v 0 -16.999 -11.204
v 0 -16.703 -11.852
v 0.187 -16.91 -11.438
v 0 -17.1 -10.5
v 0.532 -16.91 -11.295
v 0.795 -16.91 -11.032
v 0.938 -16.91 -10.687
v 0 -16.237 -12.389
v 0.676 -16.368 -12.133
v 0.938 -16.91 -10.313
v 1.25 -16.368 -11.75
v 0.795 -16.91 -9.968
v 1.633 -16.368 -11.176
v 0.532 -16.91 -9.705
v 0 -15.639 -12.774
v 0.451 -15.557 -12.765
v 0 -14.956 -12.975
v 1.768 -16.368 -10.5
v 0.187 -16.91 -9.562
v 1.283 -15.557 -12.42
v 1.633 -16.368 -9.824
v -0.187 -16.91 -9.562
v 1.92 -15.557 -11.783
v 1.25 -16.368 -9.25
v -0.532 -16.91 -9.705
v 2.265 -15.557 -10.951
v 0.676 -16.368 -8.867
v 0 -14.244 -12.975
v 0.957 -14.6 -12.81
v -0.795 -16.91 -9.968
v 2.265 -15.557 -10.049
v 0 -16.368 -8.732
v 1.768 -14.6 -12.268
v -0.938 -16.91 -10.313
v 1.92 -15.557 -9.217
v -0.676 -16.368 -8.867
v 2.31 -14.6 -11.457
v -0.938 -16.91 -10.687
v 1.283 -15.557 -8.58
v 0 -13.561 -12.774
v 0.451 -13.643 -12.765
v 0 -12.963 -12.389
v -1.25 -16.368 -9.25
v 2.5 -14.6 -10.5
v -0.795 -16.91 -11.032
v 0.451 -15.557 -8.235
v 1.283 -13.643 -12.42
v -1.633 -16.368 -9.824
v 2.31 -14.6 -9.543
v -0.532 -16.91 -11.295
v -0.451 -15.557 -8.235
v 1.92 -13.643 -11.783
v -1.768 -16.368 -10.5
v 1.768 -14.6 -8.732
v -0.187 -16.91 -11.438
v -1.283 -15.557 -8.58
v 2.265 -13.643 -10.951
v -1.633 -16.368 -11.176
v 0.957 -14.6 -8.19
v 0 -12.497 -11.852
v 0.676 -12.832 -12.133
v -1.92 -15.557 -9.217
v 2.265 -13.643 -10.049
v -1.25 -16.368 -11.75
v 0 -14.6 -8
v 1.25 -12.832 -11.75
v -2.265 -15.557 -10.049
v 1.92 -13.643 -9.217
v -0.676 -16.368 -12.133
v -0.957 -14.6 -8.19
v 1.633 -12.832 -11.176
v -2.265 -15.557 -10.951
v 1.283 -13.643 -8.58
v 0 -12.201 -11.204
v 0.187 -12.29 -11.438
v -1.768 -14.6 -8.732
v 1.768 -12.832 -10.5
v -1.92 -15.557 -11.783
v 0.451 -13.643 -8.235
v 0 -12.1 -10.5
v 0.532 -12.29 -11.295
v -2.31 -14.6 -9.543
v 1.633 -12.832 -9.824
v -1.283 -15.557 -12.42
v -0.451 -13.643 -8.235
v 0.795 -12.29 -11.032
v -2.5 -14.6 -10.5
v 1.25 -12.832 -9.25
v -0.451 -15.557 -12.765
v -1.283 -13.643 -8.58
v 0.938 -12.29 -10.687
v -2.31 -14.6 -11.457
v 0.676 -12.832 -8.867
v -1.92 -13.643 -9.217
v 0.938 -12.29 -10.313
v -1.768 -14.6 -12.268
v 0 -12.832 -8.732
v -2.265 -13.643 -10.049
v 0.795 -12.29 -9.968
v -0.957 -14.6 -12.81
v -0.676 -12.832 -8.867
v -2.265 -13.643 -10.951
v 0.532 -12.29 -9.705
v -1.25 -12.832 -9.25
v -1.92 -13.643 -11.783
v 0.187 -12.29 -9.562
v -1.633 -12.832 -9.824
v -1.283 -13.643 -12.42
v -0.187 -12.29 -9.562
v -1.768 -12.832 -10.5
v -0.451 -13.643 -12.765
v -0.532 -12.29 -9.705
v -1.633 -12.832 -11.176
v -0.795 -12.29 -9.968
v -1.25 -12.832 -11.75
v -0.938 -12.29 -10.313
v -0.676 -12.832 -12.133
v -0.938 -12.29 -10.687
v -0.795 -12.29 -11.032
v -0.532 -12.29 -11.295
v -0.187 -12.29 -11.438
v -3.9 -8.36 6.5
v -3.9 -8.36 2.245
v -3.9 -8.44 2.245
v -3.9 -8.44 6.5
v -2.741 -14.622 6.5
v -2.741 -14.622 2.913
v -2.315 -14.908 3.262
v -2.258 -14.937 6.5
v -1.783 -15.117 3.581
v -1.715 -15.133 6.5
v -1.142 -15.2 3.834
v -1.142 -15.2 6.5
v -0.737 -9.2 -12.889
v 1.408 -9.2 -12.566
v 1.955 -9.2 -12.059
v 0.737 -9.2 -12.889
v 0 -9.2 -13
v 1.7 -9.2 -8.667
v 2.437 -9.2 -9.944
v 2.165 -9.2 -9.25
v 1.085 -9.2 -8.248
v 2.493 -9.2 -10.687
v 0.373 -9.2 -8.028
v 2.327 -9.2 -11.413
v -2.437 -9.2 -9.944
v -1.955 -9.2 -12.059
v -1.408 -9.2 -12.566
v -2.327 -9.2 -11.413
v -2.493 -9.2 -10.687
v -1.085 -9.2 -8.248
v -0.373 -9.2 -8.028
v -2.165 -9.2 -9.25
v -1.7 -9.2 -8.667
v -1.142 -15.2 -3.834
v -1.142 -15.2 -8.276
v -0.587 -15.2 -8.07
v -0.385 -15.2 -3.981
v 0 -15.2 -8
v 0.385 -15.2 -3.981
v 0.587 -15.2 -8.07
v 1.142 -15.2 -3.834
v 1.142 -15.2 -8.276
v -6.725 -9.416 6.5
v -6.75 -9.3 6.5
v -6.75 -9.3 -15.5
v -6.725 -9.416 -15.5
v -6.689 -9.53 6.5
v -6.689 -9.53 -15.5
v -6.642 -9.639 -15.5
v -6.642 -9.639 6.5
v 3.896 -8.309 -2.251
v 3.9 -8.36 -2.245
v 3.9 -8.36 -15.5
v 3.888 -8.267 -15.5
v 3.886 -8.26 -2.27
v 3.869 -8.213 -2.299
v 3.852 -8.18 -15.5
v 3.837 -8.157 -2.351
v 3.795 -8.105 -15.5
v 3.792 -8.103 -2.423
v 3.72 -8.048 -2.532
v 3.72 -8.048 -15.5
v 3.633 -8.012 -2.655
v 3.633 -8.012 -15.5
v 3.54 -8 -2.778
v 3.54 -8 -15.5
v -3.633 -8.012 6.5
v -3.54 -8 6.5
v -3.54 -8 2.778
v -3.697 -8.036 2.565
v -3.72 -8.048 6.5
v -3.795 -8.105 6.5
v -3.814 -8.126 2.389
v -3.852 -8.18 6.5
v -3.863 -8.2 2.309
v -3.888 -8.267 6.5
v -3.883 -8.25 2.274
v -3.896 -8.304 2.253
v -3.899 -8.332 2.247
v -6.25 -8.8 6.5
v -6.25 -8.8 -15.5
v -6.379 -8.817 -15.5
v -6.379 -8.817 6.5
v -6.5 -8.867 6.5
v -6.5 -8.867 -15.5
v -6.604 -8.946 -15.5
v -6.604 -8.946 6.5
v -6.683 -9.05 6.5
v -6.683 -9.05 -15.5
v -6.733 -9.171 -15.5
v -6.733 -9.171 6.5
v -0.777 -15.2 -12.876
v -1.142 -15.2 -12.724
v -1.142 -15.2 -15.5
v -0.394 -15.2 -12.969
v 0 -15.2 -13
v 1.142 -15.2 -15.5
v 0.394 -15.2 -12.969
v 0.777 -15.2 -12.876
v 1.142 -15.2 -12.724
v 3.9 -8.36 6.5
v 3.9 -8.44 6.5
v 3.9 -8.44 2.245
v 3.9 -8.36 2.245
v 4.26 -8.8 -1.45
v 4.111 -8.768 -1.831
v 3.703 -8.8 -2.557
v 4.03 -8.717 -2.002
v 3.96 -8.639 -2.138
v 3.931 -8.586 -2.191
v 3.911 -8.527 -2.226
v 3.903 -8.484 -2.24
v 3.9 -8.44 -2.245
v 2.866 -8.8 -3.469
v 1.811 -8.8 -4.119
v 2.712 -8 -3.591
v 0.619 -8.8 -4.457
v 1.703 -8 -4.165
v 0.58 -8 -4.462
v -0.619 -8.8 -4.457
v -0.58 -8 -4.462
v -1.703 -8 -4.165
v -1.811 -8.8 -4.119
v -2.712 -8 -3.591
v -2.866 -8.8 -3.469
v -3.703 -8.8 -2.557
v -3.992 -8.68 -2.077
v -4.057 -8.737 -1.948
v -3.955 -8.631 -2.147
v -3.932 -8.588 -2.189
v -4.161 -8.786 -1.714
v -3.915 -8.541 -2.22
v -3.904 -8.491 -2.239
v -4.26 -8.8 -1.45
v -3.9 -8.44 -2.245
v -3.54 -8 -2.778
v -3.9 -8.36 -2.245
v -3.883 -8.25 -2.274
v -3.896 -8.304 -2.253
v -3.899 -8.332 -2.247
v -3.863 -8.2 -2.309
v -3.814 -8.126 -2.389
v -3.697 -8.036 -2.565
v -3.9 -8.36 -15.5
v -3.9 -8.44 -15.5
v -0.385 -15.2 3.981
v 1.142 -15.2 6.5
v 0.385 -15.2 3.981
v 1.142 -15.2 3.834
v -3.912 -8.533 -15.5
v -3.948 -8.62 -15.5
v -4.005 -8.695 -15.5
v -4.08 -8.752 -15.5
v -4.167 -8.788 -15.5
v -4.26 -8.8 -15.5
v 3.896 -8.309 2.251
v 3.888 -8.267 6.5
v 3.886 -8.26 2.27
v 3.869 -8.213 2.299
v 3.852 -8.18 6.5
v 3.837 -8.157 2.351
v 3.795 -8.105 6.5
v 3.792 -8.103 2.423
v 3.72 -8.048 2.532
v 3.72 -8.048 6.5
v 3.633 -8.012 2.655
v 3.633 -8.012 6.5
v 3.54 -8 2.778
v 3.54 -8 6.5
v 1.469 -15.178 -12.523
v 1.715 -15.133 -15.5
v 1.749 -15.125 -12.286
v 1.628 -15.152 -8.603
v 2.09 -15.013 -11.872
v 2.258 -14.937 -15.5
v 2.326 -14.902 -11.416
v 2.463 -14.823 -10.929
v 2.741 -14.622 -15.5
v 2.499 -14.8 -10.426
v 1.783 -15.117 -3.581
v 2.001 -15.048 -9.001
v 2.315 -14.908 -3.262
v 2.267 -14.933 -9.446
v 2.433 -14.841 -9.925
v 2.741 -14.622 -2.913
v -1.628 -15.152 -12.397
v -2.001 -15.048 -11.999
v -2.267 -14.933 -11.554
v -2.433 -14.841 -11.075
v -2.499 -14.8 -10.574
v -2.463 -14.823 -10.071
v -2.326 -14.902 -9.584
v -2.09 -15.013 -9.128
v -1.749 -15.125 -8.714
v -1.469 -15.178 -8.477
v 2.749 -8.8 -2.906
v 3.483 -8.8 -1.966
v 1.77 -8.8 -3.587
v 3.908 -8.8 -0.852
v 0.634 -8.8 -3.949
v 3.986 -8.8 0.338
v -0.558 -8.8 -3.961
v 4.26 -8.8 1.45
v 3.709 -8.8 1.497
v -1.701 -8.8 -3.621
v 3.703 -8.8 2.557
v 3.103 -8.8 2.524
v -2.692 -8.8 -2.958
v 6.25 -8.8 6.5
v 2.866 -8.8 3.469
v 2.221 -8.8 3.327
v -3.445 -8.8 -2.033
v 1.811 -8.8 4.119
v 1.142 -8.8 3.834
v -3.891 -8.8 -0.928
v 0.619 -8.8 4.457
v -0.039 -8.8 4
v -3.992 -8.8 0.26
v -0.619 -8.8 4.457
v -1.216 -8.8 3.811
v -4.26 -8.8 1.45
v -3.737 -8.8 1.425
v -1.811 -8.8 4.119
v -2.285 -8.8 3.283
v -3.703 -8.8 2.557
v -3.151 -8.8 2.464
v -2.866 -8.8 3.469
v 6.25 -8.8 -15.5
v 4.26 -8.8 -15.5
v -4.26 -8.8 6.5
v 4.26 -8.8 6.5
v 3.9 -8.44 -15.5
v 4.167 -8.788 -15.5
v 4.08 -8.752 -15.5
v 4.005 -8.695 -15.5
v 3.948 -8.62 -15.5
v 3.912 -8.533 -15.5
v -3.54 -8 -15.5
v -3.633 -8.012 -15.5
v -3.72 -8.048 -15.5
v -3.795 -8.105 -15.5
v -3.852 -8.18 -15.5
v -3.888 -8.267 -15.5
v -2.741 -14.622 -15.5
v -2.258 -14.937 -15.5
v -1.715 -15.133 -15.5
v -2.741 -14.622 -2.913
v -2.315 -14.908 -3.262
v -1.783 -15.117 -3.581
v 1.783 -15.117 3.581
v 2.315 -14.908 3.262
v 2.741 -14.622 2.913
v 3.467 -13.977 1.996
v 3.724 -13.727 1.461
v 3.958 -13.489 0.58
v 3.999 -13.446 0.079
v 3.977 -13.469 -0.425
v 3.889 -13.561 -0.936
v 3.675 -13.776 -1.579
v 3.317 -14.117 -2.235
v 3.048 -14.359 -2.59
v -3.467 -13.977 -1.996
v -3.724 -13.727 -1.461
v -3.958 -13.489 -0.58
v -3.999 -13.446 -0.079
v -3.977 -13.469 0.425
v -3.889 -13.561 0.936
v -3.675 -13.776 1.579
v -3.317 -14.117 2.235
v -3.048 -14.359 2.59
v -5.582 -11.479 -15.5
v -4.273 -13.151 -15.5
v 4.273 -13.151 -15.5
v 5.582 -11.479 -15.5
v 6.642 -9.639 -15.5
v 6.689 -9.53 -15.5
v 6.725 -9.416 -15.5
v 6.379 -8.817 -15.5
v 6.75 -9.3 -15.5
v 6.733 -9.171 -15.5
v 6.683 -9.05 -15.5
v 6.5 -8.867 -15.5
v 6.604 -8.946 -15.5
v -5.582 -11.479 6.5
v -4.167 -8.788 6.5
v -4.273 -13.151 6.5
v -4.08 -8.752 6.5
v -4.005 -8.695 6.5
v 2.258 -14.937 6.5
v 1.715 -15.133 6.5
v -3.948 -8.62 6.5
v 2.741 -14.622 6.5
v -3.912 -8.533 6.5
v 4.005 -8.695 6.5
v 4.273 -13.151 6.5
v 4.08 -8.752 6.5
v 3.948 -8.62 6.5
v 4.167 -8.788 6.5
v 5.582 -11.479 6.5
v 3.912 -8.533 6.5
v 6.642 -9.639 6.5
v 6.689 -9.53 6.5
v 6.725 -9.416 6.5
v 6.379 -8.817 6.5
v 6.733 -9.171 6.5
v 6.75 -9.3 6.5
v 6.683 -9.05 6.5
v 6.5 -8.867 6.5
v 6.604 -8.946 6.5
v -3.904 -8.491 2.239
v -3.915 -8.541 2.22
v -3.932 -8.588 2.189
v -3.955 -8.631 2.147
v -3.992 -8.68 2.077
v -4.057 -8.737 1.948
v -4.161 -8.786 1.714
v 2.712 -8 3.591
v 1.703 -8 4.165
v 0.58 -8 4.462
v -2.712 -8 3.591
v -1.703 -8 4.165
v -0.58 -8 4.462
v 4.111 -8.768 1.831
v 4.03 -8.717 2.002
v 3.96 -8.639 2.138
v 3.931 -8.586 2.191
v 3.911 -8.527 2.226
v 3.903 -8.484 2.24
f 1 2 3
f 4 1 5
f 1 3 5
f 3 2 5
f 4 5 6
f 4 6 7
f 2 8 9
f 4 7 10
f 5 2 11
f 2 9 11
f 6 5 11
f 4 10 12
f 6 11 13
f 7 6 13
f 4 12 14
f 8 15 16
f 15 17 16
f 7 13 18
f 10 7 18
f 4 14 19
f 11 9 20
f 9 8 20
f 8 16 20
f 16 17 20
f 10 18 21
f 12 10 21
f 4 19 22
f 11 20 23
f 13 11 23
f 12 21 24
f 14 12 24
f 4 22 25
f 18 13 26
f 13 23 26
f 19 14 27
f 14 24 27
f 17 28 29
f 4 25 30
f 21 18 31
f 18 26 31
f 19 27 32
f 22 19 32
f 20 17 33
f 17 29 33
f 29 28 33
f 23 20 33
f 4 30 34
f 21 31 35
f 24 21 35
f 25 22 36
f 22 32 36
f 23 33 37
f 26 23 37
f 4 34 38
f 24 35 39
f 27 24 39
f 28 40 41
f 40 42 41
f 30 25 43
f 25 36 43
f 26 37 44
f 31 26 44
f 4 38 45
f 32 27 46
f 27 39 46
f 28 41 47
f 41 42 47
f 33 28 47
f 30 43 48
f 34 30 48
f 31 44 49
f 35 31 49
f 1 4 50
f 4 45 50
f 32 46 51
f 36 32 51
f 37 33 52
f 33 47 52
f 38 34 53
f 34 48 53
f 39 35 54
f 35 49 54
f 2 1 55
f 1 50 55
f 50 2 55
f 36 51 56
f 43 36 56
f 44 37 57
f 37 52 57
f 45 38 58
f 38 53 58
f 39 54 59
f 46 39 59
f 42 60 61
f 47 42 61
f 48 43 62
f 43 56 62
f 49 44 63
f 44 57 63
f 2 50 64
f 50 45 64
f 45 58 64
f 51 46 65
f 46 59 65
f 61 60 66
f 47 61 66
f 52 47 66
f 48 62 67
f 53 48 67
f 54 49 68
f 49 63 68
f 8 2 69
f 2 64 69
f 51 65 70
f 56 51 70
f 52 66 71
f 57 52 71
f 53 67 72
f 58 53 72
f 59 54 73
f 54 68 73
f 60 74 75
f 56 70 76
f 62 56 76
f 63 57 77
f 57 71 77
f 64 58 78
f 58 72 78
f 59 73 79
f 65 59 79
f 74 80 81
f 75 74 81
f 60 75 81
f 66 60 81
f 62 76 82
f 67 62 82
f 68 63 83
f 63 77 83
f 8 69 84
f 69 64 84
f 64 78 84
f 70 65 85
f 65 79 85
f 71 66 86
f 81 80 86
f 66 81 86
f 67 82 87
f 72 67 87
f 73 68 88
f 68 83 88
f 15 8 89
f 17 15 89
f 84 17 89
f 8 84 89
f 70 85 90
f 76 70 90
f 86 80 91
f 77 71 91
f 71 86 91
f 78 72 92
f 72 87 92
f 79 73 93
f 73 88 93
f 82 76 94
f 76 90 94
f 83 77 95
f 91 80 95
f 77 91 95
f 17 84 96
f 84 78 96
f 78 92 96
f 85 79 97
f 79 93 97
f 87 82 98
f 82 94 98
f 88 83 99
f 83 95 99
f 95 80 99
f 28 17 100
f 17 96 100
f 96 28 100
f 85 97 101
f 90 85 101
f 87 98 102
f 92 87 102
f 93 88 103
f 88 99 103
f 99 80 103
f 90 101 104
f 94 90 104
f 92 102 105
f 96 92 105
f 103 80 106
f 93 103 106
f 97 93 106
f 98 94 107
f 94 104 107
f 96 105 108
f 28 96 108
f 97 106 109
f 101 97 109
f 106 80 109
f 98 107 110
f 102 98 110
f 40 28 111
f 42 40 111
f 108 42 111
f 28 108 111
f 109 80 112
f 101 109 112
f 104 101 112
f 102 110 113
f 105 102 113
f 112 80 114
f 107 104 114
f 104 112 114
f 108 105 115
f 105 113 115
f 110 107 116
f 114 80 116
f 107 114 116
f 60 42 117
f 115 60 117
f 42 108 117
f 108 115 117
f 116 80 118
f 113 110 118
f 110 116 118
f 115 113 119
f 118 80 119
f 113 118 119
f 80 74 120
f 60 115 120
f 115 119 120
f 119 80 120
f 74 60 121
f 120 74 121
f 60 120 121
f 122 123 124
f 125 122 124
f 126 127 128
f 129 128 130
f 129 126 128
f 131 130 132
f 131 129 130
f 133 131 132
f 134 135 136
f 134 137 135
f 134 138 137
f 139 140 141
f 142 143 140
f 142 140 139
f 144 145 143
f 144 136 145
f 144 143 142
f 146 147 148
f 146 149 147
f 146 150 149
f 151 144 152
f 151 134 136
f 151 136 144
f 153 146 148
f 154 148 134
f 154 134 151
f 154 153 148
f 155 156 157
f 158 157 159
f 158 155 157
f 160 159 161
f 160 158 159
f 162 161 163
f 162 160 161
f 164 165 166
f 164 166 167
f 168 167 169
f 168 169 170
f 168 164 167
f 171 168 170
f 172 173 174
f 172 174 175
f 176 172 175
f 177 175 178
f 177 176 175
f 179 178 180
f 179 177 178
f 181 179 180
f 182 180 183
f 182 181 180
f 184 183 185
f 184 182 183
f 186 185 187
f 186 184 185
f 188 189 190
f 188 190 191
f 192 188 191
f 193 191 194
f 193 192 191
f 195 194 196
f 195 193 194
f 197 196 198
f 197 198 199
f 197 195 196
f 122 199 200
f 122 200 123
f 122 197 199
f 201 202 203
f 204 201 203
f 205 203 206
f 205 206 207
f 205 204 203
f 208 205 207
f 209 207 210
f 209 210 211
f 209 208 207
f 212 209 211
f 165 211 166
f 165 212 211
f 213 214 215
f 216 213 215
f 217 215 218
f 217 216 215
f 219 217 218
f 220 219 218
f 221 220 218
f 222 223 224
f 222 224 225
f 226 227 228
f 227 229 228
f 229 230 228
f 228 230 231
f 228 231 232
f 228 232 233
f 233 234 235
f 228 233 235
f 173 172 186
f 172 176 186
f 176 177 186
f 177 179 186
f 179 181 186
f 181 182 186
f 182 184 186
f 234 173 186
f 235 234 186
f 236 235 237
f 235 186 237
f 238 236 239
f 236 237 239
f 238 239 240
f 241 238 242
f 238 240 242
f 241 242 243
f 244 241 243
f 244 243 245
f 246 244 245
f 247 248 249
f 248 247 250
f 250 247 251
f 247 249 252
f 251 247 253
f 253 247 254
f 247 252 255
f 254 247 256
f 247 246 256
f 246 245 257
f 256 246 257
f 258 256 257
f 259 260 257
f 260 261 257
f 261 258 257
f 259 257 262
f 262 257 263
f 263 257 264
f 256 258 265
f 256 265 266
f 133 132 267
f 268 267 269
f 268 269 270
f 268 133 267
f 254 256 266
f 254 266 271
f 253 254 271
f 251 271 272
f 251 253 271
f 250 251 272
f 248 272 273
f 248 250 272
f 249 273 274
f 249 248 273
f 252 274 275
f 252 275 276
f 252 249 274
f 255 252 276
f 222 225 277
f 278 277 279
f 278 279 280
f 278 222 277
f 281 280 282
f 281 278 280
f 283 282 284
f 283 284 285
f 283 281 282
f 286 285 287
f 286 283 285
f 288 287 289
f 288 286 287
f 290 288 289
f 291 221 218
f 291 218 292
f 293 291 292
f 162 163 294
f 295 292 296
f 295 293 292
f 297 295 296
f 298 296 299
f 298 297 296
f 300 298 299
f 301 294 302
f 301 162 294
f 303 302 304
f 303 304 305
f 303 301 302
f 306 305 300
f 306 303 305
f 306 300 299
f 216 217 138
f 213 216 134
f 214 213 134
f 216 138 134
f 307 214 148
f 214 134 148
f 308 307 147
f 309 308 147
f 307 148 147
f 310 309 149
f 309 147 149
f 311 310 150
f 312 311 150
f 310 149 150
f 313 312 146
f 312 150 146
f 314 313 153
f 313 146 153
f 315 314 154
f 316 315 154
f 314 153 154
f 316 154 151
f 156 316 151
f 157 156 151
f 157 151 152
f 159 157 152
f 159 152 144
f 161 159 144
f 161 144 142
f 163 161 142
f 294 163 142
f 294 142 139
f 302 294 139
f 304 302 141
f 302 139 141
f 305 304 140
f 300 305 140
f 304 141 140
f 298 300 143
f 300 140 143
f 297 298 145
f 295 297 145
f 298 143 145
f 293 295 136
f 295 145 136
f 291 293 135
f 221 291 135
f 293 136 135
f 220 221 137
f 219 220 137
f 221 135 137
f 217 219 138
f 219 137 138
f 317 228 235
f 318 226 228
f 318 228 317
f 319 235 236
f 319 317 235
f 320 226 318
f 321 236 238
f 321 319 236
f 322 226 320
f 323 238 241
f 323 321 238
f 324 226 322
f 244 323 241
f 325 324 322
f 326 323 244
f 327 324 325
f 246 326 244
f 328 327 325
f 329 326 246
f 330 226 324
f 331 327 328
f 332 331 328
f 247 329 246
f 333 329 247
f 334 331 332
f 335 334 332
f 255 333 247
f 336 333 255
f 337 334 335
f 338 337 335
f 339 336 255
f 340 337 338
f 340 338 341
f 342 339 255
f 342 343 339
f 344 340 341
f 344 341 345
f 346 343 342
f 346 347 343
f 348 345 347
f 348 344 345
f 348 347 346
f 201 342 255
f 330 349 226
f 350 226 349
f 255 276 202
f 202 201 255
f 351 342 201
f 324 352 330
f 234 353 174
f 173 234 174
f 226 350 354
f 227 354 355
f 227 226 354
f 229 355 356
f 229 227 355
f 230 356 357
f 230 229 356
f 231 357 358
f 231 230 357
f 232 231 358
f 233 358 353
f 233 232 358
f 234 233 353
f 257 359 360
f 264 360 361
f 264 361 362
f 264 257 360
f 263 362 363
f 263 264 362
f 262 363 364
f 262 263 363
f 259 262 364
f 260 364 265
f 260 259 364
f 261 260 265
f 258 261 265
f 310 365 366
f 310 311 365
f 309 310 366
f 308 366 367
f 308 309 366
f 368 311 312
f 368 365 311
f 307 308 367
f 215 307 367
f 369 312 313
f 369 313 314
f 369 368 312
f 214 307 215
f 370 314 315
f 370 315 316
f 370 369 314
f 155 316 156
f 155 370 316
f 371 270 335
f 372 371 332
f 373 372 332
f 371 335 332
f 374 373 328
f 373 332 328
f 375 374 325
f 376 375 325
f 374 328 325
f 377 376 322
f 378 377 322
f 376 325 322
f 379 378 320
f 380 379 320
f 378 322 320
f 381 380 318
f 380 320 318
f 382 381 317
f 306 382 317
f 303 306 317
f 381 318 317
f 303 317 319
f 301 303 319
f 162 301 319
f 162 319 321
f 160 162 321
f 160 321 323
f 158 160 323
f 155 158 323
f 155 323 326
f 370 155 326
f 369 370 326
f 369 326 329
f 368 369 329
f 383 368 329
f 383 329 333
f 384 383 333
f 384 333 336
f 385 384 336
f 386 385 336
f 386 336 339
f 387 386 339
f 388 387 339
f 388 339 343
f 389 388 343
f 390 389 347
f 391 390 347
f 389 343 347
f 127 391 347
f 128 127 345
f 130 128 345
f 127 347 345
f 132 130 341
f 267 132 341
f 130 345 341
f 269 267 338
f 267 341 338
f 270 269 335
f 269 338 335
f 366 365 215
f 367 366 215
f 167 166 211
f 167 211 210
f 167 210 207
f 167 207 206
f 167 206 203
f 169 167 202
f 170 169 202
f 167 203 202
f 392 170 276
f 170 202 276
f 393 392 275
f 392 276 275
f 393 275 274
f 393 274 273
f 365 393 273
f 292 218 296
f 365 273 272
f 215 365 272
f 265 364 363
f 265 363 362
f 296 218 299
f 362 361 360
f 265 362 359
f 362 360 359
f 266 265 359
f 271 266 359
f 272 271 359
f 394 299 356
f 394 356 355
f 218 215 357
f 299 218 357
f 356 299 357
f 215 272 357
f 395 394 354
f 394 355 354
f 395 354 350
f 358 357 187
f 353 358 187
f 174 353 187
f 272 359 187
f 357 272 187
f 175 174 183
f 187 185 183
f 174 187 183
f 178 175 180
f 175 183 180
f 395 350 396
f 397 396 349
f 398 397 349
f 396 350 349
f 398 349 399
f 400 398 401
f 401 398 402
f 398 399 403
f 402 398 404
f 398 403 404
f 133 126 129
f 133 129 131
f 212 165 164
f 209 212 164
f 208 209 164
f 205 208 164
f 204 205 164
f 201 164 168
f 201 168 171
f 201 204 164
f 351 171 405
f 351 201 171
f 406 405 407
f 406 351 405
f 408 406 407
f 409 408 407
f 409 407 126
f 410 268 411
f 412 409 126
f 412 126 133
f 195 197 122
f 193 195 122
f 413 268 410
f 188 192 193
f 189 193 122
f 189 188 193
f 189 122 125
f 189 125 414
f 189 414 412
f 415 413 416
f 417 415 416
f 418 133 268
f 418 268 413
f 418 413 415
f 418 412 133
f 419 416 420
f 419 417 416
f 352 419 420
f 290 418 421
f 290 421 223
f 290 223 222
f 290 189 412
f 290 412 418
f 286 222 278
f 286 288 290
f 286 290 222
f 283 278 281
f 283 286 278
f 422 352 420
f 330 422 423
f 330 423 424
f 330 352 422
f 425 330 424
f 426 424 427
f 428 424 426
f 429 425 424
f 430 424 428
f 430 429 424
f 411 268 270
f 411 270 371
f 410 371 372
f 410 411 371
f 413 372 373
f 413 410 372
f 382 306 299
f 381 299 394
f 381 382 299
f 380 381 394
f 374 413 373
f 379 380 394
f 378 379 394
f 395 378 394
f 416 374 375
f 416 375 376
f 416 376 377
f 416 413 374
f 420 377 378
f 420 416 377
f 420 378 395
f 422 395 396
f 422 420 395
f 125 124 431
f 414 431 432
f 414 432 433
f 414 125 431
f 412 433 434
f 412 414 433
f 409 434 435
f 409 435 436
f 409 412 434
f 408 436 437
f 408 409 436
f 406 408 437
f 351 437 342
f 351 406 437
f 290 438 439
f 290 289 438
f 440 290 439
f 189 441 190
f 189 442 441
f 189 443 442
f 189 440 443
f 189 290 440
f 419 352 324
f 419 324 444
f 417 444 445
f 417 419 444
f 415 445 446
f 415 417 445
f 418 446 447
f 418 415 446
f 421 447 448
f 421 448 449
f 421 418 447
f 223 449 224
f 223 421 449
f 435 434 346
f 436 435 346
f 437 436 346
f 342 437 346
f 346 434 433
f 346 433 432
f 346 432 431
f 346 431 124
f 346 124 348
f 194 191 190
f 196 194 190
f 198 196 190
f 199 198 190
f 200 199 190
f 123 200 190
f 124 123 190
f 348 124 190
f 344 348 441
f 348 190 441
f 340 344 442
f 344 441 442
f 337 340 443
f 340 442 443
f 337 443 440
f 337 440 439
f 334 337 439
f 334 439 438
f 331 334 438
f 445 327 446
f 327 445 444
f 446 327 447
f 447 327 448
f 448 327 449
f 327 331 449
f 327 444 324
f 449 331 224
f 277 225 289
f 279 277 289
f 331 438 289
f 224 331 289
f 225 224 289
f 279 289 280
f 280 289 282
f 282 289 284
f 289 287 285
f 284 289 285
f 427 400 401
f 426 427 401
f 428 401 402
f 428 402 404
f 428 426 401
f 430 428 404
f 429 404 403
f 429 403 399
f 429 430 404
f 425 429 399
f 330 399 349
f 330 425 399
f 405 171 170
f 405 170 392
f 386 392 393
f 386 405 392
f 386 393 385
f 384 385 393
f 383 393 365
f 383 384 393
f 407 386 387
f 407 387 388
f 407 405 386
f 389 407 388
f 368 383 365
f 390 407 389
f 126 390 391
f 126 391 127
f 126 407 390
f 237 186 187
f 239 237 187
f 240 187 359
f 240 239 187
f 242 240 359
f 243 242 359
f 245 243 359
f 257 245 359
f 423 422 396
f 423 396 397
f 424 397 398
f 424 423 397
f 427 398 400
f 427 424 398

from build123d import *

# Parameters (mm, degrees)
SKETCH1_R           = 4
BOSS_EXTRUDE1_DEPTH = 16
CUT_SWEEP1_PITCH    = 1.25
SKETCH4_OUTSIDE_W   = 16.42
SKETCH4_OUTSIDE_H   = 16.42
SKETCH4_OUTSIDE_R   = 3.052784715
CUT_EXTRUDE1_DEPTH  = 1.25
CUT_EXTRUDE1_DRAFT  = -45
CUT_EXTRUDE2_DEPTH  = 3
BOSS_EXTRUDE2_START = 6.5
BOSS_EXTRUDE2_DEPTH = 22
SKETCH9_R           = 4
CUT_EXTRUDE4_DEPTH  = 24.350588956
SKETCH10_W          = 2.5
SKETCH10_H          = 6
CUT_EXTRUDE5_REACH  = 23.048
SKETCH12_R          = 4.5


with BuildPart() as part:
    # Sketch1 → Boss-Extrude1 (new body)
    with BuildSketch(Plane(origin=(0, 0, 0), x_dir=(1, 0, 0), z_dir=(0, 1, 0))):
        with Locations(Location((0, 0, 0), (0, 0, 270))):
            Circle(SKETCH1_R)
    extrude(amount=-BOSS_EXTRUDE1_DEPTH)

    # Cut-Sweep1: the profile of Sketch3 screwed along a right-hand helix of 13.8 turns, 8 arcs to a turn; built about Z, then put on its axis
    cut_sweep1_z = Axis((0, 0, 0), (0, 0, 1))
    cut_sweep1_corners = [(3.188101184, 0, -0.46875), (4.067658235, 0, 0.0390625), (4.067658235, 0, -1.1328125), (3.188101184, 0, -0.625)]
    with BuildLine(mode=Mode.PRIVATE) as cut_sweep1_profile:
        Line(cut_sweep1_corners[0], cut_sweep1_corners[1])
        Line(cut_sweep1_corners[1], cut_sweep1_corners[2])
        Line(cut_sweep1_corners[2], cut_sweep1_corners[3])
        Line(cut_sweep1_corners[3], cut_sweep1_corners[0])
    cut_sweep1_cap = Face(cut_sweep1_profile.wire())
    cut_sweep1_turn_angles = [0, 22.5, 45, 67.5, 90, 112.5, 135, 157.5, 180, 202.5, 225, 247.5, 270, 292.5, 315, 337.5, 360]
    cut_sweep1_turn_weights = [1, 0.9238795325112867, 1, 0.9238795325112867, 1, 0.9238795325112867, 1, 0.9238795325112867, 1, 0.9238795325112867, 1, 0.9238795325112867, 1, 0.9238795325112867, 1, 0.9238795325112867, 1]
    cut_sweep1_turn_rails = [Edge.make_bspline([Vector(p[0], p[1], 0).rotate(cut_sweep1_z, cut_sweep1_turn_angles[k]) / cut_sweep1_turn_weights[k] + Vector(0, 0, p[2] + CUT_SWEEP1_PITCH * cut_sweep1_turn_angles[k] / 360) for k in range(17)], [0, 0, 0, 1, 1, 2, 2, 3, 3, 4, 4, 5, 5, 6, 6, 7, 7, 8, 8, 8], 2, cut_sweep1_turn_weights) for p in cut_sweep1_corners]
    cut_sweep1_turn_sides = [Face.make_surface_from_curves(cut_sweep1_turn_rails[p[0]], cut_sweep1_turn_rails[p[1]]) for p in [(0, 1), (1, 2), (2, 3), (3, 0)]]
    cut_sweep1_last_angles = [4680, 4702.5, 4725, 4747.5, 4770, 4792.5, 4815, 4837.5, 4860, 4882.5, 4905, 4927.5, 4950, 4959, 4968]
    cut_sweep1_last_weights = [1, 0.9238795325112867, 1, 0.9238795325112867, 1, 0.9238795325112867, 1, 0.9238795325112867, 1, 0.9238795325112867, 1, 0.9238795325112867, 1, 0.9876883405951427, 1]
    cut_sweep1_last_rails = [Edge.make_bspline([Vector(p[0], p[1], 0).rotate(cut_sweep1_z, cut_sweep1_last_angles[k]) / cut_sweep1_last_weights[k] + Vector(0, 0, p[2] + CUT_SWEEP1_PITCH * cut_sweep1_last_angles[k] / 360) for k in range(15)], [0, 0, 0, 1, 1, 2, 2, 3, 3, 4, 4, 5, 5, 6, 6, 7, 7, 7], 2, cut_sweep1_last_weights) for p in cut_sweep1_corners]
    cut_sweep1_last_sides = [Face.make_surface_from_curves(cut_sweep1_last_rails[p[0]], cut_sweep1_last_rails[p[1]]) for p in [(0, 1), (1, 2), (2, 3), (3, 0)]]
    cut_sweep1 = Plane(origin=(0, -16, 0), x_dir=(0, 0, -1), z_dir=(0, 1, 0)) * Solid(Shell([*[p.moved(Location((0, 0, CUT_SWEEP1_PITCH * i))) for i in range(13) for p in cut_sweep1_turn_sides], *cut_sweep1_last_sides, cut_sweep1_cap, cut_sweep1_cap.rotate(cut_sweep1_z, 4968).moved(Location((0, 0, CUT_SWEEP1_PITCH * 4968 / 360)))]))
    add(cut_sweep1, mode=Mode.SUBTRACT)


with BuildPart() as cut_extrude1_tool:
    # Sketch4 outside → Cut-Extrude1 (with draft: the straight prism first)
    with BuildSketch(Plane.XZ.offset(16)):
        Rectangle(SKETCH4_OUTSIDE_W, SKETCH4_OUTSIDE_H)
        Circle(SKETCH4_OUTSIDE_R, mode=Mode.SUBTRACT)
    extrude(amount=-CUT_EXTRUDE1_DEPTH)
    # Cut-Extrude1: the draft: its side faces are tilted about the plane it starts from
    cut_extrude1_sides = [cut_extrude1_tool.faces().sort_by_distance(p)[0] for p in [
        (0, -15.375, -8.21),
        (8.21, -15.375, 0),
        (0, -15.375, 8.21),
        (-8.21, -15.375, 0),
        (-3.052784715, -15.375, 0),
    ]]
    draft(cut_extrude1_sides, Plane.XZ.offset(16), CUT_EXTRUDE1_DRAFT)


with BuildPart() as part_1:
    add(part.part)

    # Cut-Extrude1: cut by cut_extrude1_tool
    add(cut_extrude1_tool.part, mode=Mode.SUBTRACT)

    # Sketch5 → Revolve1 (revolve)
    with BuildSketch(Plane.XY, mode=Mode.PRIVATE) as revolve1_sk:
        with BuildLine():
            Line((0, 4.4), (0, 0))
            Line((0, 0), (-7, 0))
            Line((-7, 0), (-7, 1.1))
            ThreePointArc((-7, 1.1), (-5.74216858, 2.970153254), (-4, 4.4))
            Line((-4, 4.4), (0, 4.4))
        make_face()
    revolve(revolve1_sk.sketch.rotate(Axis((0, 0, 0), (0, -1, 0)), 90), axis=Axis((0, 0, 0), (0, -1, 0)))

    # Sketch6 → Cut-Extrude2 (cut)
    with BuildSketch(Plane(origin=(0, 4.4, 0), x_dir=(1, 0, 0), z_dir=(0, 1, 0))):
        Polygon((0, 2.886751346), (-2.5, 1.443375673), (-2.5, -1.443375673), (0, -2.886751346), (2.5, -1.443375673), (2.5, 1.443375673), align=None)
    extrude(amount=-CUT_EXTRUDE2_DEPTH, mode=Mode.SUBTRACT)

    # Cut-Extrude3 cone 1 section (through the dimple's axis) → Cut-Extrude3 (revolve, cut)
    with BuildSketch(Plane(origin=(0, 4.4, 0), x_dir=(0, 0, 1), z_dir=(1, 0, 0))):
        Polygon((0, 0), (2.886751346, 0), (0, 2.886751346), align=None)
    revolve(axis=Axis((0, 4.4, 0), (0, -1, 0)), mode=Mode.SUBTRACT)


with BuildPart() as body_2:
    # Sketch8 → Boss-Extrude2 (new body)
    with BuildSketch(Plane.XY.offset(BOSS_EXTRUDE2_START)):
        with BuildLine():
            Line((-1.141910018, -15.2), (1.141910018, -15.2))
            ThreePointArc((1.141910018, -15.2), (1.992150427, -15.050976658), (2.741026302, -14.621672998))
            ThreePointArc((2.741026302, -14.621672998), (4.957086228, -12.338580682), (6.641744362, -9.639440246))
            ThreePointArc((6.641744362, -9.639440246), (6.708027965, -9.473596894), (6.75, -9.3))
            ThreePointArc((6.75, -9.3), (6.603553391, -8.946446609), (6.25, -8.8))
            Line((6.25, -8.8), (4.26, -8.8))
            ThreePointArc((4.26, -8.8), (4.005441559, -8.694558441), (3.9, -8.44))
            Line((3.9, -8.44), (3.9, -8.36))
            ThreePointArc((3.9, -8.36), (3.794558441, -8.105441559), (3.54, -8))
            Line((3.54, -8), (-3.54, -8))
            ThreePointArc((-3.54, -8), (-3.794558441, -8.105441559), (-3.9, -8.36))
            Line((-3.9, -8.36), (-3.9, -8.44))
            ThreePointArc((-3.9, -8.44), (-4.005441559, -8.694558441), (-4.26, -8.8))
            Line((-4.26, -8.8), (-6.25, -8.8))
            ThreePointArc((-6.25, -8.8), (-6.603553391, -8.946446609), (-6.75, -9.3))
            ThreePointArc((-6.75, -9.3), (-6.708027965, -9.473596894), (-6.641744362, -9.639440246))
            ThreePointArc((-6.641744362, -9.639440246), (-4.957086228, -12.338580682), (-2.741026302, -14.621672998))
            ThreePointArc((-2.741026302, -14.621672998), (-1.992150427, -15.050976658), (-1.141910018, -15.2))
        make_face()
    extrude(amount=-BOSS_EXTRUDE2_DEPTH)

    # Sketch9 → Cut-Extrude4 (cut, through all)
    with BuildSketch(Plane(origin=(0, 0, 0), x_dir=(1, 0, 0), z_dir=(0, 1, 0))):
        with Locations(Location((0, 0, 0), (0, 0, 286.587393433))):
            Circle(SKETCH9_R)
    extrude(amount=-CUT_EXTRUDE4_DEPTH, mode=Mode.SUBTRACT)

    # Sketch10 → Cut-Revolve1 (revolve, cut)
    with BuildSketch(Plane(origin=(0, 0, 0), x_dir=(0, 0, -1), z_dir=(1, 0, 0))):
        with Locations((11.75, -12.2)):
            Rectangle(SKETCH10_W, SKETCH10_H)
    revolve(axis=Axis((0, -9.2, -10.5), (0, 1, 0)), mode=Mode.SUBTRACT)

    # Cut-Extrude5: up to this face of the body (flat: up to its plane)
    cut_extrude5_end = Plane(body_2.part.faces().sort_by_distance((5.255, -8.8, -4.5))[0])
    # Sketch12 → Cut-Extrude5 (cut, up to the picked face)
    with BuildSketch(Plane(origin=(0, -8, 0), x_dir=(1, 0, 0), z_dir=(0, 1, 0)), mode=Mode.PRIVATE) as cut_extrude5_sk1:
        Circle(SKETCH12_R)
    cut_extrude5_tool1 = split(extrude(cut_extrude5_sk1.sketch, amount=-CUT_EXTRUDE5_REACH, mode=Mode.PRIVATE), bisect_by=cut_extrude5_end, keep=Keep.BOTH, mode=Mode.PRIVATE)
    add(cut_extrude5_tool1.solids().sort_by(Axis((0, -8, 0), (0, -1, 0)))[0], mode=Mode.SUBTRACT)


with BuildPart() as body_3:
    # Sketch11 → Revolve2 (revolve)
    with BuildSketch(Plane(origin=(0, 0, 0), x_dir=(0, 0, -1), z_dir=(1, 0, 0))):
        with BuildLine():
            Line((10.5, -12.1), (10.5, -17.1))
            ThreePointArc((10.5, -17.1), (13, -14.6), (10.5, -12.1))
        make_face()
    revolve(axis=Axis((0, -12.1, -10.5), (0, -1, 0)))


solid = Compound([body_2.part, body_3.part])
